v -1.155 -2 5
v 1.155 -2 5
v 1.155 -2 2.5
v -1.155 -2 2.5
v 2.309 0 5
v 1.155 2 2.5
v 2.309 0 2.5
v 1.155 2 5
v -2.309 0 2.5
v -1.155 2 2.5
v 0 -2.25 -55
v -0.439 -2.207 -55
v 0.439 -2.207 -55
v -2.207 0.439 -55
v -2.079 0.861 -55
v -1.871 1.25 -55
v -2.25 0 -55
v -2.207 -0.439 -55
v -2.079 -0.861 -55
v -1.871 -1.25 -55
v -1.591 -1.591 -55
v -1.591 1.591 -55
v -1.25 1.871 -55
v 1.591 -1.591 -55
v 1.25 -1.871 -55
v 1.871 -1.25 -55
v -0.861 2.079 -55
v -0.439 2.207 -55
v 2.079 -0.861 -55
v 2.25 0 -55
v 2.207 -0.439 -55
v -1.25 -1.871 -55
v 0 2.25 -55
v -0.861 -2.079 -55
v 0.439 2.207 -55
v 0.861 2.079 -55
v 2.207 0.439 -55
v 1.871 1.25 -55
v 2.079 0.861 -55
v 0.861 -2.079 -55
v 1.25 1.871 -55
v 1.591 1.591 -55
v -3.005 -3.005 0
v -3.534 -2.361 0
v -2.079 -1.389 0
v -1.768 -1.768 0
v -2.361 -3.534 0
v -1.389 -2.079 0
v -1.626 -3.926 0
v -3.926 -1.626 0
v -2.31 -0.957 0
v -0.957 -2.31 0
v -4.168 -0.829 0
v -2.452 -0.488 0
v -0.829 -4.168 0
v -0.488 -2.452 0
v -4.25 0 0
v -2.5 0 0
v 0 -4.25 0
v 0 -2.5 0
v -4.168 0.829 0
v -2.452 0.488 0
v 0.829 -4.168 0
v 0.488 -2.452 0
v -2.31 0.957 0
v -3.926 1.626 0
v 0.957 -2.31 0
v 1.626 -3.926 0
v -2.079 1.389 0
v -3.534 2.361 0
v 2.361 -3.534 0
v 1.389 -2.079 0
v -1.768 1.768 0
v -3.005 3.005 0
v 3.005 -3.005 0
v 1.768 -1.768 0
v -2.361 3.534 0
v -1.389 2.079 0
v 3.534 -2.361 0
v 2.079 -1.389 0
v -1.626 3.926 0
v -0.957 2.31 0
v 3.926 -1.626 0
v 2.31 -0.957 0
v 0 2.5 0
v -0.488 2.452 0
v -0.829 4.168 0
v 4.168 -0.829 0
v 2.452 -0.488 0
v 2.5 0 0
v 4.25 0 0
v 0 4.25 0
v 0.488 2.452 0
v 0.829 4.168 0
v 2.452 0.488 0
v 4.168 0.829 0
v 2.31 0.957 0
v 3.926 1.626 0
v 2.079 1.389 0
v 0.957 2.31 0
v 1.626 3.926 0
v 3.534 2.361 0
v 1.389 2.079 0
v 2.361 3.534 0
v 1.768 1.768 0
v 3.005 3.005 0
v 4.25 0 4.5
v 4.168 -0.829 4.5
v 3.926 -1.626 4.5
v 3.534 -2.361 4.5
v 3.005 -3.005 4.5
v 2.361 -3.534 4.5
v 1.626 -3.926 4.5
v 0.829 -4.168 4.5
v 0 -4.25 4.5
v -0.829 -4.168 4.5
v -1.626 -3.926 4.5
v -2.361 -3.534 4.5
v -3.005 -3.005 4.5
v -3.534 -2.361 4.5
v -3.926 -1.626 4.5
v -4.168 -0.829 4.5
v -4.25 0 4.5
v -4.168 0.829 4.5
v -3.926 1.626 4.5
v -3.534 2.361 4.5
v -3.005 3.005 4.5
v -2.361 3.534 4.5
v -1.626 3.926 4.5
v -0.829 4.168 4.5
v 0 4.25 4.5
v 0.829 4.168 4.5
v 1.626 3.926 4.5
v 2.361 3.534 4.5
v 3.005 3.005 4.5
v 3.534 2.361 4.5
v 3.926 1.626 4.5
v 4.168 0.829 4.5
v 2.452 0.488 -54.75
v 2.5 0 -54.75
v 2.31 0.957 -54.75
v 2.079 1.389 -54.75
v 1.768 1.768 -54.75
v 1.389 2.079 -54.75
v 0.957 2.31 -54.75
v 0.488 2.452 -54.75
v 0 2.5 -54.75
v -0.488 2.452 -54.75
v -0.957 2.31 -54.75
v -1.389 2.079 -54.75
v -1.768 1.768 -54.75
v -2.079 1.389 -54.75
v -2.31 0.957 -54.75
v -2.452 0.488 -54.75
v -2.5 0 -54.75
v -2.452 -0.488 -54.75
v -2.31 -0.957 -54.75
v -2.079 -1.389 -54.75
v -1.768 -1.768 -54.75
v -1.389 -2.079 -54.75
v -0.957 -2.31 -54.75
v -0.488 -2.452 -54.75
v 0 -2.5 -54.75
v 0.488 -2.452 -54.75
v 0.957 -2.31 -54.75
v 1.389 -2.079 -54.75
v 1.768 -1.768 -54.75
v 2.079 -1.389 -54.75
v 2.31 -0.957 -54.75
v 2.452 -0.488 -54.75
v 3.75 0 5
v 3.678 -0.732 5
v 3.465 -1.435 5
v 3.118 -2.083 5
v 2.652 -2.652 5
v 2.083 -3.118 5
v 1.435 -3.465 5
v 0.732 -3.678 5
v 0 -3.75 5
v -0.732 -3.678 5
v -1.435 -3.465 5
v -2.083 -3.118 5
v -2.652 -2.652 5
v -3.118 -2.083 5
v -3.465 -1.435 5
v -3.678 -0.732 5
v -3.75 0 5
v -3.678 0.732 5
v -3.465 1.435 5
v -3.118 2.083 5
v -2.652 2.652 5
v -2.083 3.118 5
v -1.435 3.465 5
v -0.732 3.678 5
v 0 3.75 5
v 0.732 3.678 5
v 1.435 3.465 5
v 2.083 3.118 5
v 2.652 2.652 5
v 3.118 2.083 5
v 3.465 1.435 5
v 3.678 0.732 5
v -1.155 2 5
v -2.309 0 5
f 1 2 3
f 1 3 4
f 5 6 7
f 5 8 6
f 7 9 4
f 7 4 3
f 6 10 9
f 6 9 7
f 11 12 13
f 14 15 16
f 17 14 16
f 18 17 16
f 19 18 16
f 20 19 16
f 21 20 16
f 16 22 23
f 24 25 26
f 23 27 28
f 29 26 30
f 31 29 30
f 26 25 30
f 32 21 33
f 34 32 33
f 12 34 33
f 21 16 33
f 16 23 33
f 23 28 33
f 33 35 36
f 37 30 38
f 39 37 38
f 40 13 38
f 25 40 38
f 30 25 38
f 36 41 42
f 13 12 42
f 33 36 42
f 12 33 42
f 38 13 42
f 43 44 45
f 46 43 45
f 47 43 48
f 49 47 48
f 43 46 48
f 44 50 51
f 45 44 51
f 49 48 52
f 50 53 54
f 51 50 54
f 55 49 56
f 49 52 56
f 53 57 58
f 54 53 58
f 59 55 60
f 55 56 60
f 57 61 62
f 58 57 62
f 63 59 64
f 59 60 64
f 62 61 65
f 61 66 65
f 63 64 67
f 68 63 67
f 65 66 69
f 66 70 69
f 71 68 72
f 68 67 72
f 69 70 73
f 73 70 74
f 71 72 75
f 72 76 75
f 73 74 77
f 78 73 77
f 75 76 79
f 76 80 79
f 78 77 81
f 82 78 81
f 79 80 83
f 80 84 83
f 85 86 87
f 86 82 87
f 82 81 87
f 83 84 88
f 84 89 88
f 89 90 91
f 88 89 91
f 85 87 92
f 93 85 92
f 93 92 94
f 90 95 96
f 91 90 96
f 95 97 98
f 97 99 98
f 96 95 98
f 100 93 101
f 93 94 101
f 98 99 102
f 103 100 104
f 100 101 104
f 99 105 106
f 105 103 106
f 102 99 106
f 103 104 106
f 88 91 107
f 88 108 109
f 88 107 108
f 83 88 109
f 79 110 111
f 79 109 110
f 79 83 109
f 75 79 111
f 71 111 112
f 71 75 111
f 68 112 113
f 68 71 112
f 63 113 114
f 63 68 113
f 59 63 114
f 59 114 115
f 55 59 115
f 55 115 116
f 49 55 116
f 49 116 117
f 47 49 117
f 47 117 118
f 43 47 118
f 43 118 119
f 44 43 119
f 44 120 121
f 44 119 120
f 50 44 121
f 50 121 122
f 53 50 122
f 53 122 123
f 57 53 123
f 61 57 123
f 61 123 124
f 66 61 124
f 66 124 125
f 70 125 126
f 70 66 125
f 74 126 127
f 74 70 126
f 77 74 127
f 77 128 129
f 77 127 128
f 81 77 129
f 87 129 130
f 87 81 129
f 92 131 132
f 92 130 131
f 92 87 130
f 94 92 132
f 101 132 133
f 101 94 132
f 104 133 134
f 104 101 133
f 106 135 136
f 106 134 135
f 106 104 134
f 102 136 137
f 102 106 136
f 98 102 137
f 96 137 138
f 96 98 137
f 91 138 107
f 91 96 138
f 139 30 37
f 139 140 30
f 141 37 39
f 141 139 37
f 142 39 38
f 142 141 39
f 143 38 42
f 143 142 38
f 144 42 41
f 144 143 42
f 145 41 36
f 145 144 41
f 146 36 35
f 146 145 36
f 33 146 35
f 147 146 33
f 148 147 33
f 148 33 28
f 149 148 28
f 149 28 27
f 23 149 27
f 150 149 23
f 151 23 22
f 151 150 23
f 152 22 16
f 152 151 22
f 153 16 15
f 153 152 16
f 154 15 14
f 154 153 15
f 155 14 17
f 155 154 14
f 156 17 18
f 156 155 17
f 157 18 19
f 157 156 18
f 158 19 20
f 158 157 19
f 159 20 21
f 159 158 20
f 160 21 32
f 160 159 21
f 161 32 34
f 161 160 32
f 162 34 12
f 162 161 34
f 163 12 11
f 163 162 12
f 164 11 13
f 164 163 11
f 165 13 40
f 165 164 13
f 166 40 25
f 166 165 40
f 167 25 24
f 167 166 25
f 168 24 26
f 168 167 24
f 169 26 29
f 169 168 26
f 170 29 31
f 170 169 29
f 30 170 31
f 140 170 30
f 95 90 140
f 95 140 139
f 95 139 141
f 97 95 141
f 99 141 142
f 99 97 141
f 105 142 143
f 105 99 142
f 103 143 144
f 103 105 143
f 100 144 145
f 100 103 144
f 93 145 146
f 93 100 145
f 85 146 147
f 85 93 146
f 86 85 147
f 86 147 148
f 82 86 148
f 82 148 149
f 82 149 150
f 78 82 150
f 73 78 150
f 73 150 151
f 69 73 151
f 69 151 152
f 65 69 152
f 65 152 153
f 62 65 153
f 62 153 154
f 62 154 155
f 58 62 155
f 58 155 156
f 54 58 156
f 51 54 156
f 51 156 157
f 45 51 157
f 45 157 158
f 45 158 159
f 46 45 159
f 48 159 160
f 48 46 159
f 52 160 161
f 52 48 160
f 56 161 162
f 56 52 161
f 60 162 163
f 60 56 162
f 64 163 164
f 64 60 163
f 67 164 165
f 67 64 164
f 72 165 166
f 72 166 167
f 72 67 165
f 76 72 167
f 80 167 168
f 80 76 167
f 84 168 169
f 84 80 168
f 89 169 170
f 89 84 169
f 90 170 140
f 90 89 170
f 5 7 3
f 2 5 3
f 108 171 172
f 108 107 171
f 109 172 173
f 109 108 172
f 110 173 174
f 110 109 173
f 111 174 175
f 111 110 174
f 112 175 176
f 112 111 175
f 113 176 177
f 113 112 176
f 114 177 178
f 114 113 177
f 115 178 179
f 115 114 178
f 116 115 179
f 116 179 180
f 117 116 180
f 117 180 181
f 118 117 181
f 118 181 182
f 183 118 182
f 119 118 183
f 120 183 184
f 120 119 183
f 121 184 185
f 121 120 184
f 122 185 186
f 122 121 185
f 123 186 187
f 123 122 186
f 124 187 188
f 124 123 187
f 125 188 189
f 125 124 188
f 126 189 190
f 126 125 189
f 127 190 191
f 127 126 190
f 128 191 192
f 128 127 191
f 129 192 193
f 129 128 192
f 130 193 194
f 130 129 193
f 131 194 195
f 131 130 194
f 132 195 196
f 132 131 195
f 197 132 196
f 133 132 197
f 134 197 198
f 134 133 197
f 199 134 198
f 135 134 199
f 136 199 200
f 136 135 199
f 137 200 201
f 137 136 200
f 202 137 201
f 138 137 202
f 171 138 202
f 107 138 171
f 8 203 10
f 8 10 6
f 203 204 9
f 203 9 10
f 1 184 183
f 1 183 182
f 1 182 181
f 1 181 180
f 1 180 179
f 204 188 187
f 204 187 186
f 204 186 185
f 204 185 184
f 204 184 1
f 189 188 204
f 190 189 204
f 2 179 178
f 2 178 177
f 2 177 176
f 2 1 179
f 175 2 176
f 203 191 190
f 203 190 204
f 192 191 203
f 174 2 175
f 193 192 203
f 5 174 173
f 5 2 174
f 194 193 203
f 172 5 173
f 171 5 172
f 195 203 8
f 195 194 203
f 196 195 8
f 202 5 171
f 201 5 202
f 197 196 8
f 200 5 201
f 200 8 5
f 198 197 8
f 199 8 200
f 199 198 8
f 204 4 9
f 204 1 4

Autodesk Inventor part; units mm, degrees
ref_plane "YZ Plane" through (0, 0, 0) normal (1, 0, 0) x (0, 1, 0)
ref_plane "XZ Plane" through (0, 0, 0) normal (0, 1, 0) x (-1, 0, 0)
ref_plane "XY Plane" through (0, 0, 0) normal (0, 0, 1) x (1, 0, 0)
sketch "Sketch3" plane through (0, 0, 0) normal (0, 0, 1) x (1, 0, 0)
  circle A0 centre (0, 0) radius 2.5
  dimension "Diameter" = 5
extrude "Extrusion1" add sketch "Sketch3" against normal blind 55
sketch "Sketch4" plane through (0, 0, 0) normal (0, 0, 1) x (1, 0, 0)
  circle A0 centre (0, 0) radius 2.5 projected
  circle A1 centre (0, 0) radius 4.25
  dimension "Head_Diameter" = 8.5
extrude "Extrusion2" add sketch "Sketch4" along normal blind 5 contours A0 | A1
sketch "Sketch5" plane through (0, 0, 5) normal (0, 0, 1) x (1, 0, 0)
  circle A0 centre (0, 0) radius 4.25 projected
  line L0 (2.3094, 0) -> (1.1547, -2)
  line L1 (1.1547, -2) -> (-1.1547, -2)
  line L2 (-1.1547, -2) -> (-2.3094, 0)
  line L3 (-2.3094, 0) -> (-1.1547, 2)
  line L4 (-1.1547, 2) -> (1.1547, 2)
  line L5 (1.1547, 2) -> (2.3094, 0)
  line L6 (0, 0) -> (2.3094, 0) construction
  dimension "Hex_Width" = 4
extrude "Extrusion3" cut sketch "Sketch5" against normal blind 2.5 contours L0 L1 L2 L3 L4 L5
thread "Thread1" size "M5x0.8" class "4g6g" standard "ANSI Metric M Profile" length 22
chamfer "Chamfer1" distance 0.5 angle 45 1 edges at (-4.25, 0, 5)
chamfer "Chamfer2" distance 0.25 angle 45 1 edges at (-2.5, 0, -55)
equation "\"d14\" = 0.5 * Chamfer"
equation "\"Chamfer\" = 0.5"
properties part number "fmpshma050080050" material "Steel, MS"
